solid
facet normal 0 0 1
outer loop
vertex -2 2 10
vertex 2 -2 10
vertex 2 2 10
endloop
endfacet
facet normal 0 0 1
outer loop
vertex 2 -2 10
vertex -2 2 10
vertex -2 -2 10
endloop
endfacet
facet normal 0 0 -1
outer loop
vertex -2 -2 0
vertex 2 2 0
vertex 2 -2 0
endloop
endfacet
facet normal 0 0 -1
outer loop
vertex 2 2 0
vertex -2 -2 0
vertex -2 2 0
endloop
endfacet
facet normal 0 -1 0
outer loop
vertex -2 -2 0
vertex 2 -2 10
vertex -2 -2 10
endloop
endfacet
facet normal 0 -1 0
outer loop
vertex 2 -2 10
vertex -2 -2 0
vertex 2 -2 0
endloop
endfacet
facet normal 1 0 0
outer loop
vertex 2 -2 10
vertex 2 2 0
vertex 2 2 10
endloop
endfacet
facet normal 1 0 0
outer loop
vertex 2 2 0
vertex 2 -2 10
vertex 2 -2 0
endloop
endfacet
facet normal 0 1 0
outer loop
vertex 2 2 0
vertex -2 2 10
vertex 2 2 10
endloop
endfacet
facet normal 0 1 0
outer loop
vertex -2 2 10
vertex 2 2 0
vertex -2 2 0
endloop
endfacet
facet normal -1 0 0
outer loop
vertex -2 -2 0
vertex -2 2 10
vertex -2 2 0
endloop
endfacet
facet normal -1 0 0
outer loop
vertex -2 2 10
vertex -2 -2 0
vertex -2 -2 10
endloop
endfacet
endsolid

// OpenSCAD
translate([0, 0, 5]) color([0,1,0,0.9]) cube([4, 4, 10], center=true);
